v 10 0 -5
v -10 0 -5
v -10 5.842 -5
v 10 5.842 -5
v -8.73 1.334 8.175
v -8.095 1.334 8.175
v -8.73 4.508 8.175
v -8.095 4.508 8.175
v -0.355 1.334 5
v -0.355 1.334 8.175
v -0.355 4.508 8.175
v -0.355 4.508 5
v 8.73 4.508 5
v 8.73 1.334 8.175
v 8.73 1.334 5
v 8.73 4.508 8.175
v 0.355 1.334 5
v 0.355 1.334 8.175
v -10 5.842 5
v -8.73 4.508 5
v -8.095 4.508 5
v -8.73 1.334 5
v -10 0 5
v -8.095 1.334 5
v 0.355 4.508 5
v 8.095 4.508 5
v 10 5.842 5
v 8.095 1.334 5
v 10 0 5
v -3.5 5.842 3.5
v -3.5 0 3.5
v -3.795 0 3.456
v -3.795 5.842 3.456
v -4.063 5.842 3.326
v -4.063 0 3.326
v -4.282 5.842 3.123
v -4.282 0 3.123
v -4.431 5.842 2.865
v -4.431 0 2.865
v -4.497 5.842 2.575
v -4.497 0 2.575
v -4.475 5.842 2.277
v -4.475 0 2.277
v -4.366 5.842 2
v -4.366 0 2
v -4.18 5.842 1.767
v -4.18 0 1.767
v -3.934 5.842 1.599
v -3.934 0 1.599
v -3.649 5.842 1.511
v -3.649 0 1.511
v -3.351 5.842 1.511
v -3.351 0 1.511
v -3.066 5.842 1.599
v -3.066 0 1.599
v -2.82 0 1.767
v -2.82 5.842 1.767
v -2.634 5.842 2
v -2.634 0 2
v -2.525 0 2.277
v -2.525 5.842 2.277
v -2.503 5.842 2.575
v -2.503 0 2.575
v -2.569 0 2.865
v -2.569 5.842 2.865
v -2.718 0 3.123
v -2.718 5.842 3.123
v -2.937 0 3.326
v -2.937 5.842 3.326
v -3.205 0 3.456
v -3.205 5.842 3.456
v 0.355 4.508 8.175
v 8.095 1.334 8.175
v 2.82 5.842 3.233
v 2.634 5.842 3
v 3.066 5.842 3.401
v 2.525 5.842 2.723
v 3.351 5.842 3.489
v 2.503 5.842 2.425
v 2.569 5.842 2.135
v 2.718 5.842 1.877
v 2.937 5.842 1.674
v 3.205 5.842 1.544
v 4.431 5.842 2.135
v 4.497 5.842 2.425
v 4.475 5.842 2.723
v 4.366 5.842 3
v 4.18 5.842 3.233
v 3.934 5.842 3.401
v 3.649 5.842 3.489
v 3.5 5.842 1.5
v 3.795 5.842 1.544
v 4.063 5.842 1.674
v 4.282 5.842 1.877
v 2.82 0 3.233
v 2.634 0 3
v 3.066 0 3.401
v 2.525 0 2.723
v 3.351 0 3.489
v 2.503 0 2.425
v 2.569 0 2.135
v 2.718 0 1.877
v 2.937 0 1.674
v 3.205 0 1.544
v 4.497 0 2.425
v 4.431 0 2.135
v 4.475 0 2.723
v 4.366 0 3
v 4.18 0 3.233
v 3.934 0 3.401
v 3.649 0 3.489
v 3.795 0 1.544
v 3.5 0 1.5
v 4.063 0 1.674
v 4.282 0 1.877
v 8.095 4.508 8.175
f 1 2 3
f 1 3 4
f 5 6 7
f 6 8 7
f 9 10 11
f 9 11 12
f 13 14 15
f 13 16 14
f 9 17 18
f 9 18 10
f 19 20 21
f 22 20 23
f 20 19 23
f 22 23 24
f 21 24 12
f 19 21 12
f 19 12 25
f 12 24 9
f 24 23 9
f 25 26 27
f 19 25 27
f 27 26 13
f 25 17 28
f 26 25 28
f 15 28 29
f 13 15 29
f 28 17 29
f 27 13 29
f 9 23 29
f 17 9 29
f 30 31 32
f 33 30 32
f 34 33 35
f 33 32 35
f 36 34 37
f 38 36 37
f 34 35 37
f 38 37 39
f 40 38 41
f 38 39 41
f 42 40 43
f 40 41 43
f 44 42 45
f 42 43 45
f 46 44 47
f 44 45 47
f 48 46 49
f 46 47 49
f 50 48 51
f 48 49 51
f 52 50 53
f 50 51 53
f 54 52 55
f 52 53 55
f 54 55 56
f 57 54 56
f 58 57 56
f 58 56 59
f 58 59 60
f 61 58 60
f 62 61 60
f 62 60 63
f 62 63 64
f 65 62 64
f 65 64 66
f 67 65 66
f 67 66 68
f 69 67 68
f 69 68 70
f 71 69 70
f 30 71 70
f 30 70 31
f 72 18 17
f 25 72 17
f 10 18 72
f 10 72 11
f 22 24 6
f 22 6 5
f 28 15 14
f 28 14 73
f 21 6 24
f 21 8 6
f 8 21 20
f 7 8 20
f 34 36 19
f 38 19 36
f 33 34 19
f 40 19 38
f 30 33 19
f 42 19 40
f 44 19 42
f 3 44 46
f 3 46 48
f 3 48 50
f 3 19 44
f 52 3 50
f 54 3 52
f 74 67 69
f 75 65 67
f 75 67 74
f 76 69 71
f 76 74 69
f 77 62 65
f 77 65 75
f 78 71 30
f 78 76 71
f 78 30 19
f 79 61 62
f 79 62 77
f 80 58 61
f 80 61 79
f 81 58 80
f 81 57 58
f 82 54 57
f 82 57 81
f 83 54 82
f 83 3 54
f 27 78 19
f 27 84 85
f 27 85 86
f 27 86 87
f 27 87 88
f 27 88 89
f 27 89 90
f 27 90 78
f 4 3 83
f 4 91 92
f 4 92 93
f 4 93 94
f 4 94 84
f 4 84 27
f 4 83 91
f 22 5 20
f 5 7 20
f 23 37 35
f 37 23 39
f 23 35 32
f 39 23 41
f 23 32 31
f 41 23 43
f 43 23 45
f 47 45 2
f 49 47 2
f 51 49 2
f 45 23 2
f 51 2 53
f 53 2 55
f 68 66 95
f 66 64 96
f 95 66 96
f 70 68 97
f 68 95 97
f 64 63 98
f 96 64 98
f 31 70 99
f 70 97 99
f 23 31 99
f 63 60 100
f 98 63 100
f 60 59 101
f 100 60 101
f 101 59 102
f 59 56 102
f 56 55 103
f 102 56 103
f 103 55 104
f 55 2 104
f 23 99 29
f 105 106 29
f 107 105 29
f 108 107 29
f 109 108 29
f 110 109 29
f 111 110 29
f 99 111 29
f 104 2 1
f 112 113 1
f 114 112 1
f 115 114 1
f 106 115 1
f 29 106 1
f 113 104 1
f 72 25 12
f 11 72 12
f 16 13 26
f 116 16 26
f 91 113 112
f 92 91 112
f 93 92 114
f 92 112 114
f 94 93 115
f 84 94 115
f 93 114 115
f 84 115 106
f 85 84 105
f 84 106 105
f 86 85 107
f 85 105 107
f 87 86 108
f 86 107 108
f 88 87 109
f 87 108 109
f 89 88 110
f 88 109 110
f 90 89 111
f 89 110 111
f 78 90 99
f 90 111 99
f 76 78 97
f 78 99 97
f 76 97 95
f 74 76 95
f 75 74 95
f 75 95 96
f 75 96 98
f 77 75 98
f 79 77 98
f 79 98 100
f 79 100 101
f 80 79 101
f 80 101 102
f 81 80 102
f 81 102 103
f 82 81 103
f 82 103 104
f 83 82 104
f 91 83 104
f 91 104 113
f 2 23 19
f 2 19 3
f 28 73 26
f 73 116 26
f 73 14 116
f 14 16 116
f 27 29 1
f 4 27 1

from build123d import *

# Parameters (mm, degrees)
ESQUISSE1_W             = 20
ESQUISSE1_H             = 10
BOSS_EXTRU_1_DEPTH      = 5.842
ESQUISSE2_W             = 0.635
ESQUISSE2_H             = 3.175
ESQUISSE2_W_2           = 0.70971707
BOSS_EXTRU_3_DEPTH      = 1.5875
ESQUISSE3_R             = 1
ENL_V_MAT_EXTRU_1_DEPTH = 15.176021621


with BuildPart() as part:
    # Esquisse1 → Boss.-Extru.1 (new body)
    with BuildSketch(Plane(origin=(0, 0, 0), x_dir=(1, 0, 0), z_dir=(0, 1, 0))):
        Rectangle(ESQUISSE1_W, ESQUISSE1_H)
    extrude(amount=BOSS_EXTRU_1_DEPTH)

    # Esquisse2 → Boss.-Extru.3 (add, symmetric)
    with BuildSketch(Plane(origin=(0, 2.921, 0), x_dir=(-1, 0, 0), z_dir=(0, -1, 0))):
        with Locations((8.4125, -6.5875)):
            Rectangle(ESQUISSE2_W, ESQUISSE2_H)
        with Locations((-8.4125, -6.5875)):
            Rectangle(ESQUISSE2_W, ESQUISSE2_H)
        with Locations((0, -6.5875)):
            Rectangle(ESQUISSE2_W_2, ESQUISSE2_H)
    extrude(amount=BOSS_EXTRU_3_DEPTH, both=True)

    # Esquisse3 → Enlèv. mat.-Extru.1 (cut, through all)
    with BuildSketch(Plane.XZ):
        with Locations(Location((3.5, 2.5, 0), (0, 0, 270))):
            Circle(ESQUISSE3_R)
        with Locations(Location((-3.5, 2.5, 0), (0, 0, 90))):
            Circle(ESQUISSE3_R)
    extrude(amount=-ENL_V_MAT_EXTRU_1_DEPTH, mode=Mode.SUBTRACT)


solid = part.part
